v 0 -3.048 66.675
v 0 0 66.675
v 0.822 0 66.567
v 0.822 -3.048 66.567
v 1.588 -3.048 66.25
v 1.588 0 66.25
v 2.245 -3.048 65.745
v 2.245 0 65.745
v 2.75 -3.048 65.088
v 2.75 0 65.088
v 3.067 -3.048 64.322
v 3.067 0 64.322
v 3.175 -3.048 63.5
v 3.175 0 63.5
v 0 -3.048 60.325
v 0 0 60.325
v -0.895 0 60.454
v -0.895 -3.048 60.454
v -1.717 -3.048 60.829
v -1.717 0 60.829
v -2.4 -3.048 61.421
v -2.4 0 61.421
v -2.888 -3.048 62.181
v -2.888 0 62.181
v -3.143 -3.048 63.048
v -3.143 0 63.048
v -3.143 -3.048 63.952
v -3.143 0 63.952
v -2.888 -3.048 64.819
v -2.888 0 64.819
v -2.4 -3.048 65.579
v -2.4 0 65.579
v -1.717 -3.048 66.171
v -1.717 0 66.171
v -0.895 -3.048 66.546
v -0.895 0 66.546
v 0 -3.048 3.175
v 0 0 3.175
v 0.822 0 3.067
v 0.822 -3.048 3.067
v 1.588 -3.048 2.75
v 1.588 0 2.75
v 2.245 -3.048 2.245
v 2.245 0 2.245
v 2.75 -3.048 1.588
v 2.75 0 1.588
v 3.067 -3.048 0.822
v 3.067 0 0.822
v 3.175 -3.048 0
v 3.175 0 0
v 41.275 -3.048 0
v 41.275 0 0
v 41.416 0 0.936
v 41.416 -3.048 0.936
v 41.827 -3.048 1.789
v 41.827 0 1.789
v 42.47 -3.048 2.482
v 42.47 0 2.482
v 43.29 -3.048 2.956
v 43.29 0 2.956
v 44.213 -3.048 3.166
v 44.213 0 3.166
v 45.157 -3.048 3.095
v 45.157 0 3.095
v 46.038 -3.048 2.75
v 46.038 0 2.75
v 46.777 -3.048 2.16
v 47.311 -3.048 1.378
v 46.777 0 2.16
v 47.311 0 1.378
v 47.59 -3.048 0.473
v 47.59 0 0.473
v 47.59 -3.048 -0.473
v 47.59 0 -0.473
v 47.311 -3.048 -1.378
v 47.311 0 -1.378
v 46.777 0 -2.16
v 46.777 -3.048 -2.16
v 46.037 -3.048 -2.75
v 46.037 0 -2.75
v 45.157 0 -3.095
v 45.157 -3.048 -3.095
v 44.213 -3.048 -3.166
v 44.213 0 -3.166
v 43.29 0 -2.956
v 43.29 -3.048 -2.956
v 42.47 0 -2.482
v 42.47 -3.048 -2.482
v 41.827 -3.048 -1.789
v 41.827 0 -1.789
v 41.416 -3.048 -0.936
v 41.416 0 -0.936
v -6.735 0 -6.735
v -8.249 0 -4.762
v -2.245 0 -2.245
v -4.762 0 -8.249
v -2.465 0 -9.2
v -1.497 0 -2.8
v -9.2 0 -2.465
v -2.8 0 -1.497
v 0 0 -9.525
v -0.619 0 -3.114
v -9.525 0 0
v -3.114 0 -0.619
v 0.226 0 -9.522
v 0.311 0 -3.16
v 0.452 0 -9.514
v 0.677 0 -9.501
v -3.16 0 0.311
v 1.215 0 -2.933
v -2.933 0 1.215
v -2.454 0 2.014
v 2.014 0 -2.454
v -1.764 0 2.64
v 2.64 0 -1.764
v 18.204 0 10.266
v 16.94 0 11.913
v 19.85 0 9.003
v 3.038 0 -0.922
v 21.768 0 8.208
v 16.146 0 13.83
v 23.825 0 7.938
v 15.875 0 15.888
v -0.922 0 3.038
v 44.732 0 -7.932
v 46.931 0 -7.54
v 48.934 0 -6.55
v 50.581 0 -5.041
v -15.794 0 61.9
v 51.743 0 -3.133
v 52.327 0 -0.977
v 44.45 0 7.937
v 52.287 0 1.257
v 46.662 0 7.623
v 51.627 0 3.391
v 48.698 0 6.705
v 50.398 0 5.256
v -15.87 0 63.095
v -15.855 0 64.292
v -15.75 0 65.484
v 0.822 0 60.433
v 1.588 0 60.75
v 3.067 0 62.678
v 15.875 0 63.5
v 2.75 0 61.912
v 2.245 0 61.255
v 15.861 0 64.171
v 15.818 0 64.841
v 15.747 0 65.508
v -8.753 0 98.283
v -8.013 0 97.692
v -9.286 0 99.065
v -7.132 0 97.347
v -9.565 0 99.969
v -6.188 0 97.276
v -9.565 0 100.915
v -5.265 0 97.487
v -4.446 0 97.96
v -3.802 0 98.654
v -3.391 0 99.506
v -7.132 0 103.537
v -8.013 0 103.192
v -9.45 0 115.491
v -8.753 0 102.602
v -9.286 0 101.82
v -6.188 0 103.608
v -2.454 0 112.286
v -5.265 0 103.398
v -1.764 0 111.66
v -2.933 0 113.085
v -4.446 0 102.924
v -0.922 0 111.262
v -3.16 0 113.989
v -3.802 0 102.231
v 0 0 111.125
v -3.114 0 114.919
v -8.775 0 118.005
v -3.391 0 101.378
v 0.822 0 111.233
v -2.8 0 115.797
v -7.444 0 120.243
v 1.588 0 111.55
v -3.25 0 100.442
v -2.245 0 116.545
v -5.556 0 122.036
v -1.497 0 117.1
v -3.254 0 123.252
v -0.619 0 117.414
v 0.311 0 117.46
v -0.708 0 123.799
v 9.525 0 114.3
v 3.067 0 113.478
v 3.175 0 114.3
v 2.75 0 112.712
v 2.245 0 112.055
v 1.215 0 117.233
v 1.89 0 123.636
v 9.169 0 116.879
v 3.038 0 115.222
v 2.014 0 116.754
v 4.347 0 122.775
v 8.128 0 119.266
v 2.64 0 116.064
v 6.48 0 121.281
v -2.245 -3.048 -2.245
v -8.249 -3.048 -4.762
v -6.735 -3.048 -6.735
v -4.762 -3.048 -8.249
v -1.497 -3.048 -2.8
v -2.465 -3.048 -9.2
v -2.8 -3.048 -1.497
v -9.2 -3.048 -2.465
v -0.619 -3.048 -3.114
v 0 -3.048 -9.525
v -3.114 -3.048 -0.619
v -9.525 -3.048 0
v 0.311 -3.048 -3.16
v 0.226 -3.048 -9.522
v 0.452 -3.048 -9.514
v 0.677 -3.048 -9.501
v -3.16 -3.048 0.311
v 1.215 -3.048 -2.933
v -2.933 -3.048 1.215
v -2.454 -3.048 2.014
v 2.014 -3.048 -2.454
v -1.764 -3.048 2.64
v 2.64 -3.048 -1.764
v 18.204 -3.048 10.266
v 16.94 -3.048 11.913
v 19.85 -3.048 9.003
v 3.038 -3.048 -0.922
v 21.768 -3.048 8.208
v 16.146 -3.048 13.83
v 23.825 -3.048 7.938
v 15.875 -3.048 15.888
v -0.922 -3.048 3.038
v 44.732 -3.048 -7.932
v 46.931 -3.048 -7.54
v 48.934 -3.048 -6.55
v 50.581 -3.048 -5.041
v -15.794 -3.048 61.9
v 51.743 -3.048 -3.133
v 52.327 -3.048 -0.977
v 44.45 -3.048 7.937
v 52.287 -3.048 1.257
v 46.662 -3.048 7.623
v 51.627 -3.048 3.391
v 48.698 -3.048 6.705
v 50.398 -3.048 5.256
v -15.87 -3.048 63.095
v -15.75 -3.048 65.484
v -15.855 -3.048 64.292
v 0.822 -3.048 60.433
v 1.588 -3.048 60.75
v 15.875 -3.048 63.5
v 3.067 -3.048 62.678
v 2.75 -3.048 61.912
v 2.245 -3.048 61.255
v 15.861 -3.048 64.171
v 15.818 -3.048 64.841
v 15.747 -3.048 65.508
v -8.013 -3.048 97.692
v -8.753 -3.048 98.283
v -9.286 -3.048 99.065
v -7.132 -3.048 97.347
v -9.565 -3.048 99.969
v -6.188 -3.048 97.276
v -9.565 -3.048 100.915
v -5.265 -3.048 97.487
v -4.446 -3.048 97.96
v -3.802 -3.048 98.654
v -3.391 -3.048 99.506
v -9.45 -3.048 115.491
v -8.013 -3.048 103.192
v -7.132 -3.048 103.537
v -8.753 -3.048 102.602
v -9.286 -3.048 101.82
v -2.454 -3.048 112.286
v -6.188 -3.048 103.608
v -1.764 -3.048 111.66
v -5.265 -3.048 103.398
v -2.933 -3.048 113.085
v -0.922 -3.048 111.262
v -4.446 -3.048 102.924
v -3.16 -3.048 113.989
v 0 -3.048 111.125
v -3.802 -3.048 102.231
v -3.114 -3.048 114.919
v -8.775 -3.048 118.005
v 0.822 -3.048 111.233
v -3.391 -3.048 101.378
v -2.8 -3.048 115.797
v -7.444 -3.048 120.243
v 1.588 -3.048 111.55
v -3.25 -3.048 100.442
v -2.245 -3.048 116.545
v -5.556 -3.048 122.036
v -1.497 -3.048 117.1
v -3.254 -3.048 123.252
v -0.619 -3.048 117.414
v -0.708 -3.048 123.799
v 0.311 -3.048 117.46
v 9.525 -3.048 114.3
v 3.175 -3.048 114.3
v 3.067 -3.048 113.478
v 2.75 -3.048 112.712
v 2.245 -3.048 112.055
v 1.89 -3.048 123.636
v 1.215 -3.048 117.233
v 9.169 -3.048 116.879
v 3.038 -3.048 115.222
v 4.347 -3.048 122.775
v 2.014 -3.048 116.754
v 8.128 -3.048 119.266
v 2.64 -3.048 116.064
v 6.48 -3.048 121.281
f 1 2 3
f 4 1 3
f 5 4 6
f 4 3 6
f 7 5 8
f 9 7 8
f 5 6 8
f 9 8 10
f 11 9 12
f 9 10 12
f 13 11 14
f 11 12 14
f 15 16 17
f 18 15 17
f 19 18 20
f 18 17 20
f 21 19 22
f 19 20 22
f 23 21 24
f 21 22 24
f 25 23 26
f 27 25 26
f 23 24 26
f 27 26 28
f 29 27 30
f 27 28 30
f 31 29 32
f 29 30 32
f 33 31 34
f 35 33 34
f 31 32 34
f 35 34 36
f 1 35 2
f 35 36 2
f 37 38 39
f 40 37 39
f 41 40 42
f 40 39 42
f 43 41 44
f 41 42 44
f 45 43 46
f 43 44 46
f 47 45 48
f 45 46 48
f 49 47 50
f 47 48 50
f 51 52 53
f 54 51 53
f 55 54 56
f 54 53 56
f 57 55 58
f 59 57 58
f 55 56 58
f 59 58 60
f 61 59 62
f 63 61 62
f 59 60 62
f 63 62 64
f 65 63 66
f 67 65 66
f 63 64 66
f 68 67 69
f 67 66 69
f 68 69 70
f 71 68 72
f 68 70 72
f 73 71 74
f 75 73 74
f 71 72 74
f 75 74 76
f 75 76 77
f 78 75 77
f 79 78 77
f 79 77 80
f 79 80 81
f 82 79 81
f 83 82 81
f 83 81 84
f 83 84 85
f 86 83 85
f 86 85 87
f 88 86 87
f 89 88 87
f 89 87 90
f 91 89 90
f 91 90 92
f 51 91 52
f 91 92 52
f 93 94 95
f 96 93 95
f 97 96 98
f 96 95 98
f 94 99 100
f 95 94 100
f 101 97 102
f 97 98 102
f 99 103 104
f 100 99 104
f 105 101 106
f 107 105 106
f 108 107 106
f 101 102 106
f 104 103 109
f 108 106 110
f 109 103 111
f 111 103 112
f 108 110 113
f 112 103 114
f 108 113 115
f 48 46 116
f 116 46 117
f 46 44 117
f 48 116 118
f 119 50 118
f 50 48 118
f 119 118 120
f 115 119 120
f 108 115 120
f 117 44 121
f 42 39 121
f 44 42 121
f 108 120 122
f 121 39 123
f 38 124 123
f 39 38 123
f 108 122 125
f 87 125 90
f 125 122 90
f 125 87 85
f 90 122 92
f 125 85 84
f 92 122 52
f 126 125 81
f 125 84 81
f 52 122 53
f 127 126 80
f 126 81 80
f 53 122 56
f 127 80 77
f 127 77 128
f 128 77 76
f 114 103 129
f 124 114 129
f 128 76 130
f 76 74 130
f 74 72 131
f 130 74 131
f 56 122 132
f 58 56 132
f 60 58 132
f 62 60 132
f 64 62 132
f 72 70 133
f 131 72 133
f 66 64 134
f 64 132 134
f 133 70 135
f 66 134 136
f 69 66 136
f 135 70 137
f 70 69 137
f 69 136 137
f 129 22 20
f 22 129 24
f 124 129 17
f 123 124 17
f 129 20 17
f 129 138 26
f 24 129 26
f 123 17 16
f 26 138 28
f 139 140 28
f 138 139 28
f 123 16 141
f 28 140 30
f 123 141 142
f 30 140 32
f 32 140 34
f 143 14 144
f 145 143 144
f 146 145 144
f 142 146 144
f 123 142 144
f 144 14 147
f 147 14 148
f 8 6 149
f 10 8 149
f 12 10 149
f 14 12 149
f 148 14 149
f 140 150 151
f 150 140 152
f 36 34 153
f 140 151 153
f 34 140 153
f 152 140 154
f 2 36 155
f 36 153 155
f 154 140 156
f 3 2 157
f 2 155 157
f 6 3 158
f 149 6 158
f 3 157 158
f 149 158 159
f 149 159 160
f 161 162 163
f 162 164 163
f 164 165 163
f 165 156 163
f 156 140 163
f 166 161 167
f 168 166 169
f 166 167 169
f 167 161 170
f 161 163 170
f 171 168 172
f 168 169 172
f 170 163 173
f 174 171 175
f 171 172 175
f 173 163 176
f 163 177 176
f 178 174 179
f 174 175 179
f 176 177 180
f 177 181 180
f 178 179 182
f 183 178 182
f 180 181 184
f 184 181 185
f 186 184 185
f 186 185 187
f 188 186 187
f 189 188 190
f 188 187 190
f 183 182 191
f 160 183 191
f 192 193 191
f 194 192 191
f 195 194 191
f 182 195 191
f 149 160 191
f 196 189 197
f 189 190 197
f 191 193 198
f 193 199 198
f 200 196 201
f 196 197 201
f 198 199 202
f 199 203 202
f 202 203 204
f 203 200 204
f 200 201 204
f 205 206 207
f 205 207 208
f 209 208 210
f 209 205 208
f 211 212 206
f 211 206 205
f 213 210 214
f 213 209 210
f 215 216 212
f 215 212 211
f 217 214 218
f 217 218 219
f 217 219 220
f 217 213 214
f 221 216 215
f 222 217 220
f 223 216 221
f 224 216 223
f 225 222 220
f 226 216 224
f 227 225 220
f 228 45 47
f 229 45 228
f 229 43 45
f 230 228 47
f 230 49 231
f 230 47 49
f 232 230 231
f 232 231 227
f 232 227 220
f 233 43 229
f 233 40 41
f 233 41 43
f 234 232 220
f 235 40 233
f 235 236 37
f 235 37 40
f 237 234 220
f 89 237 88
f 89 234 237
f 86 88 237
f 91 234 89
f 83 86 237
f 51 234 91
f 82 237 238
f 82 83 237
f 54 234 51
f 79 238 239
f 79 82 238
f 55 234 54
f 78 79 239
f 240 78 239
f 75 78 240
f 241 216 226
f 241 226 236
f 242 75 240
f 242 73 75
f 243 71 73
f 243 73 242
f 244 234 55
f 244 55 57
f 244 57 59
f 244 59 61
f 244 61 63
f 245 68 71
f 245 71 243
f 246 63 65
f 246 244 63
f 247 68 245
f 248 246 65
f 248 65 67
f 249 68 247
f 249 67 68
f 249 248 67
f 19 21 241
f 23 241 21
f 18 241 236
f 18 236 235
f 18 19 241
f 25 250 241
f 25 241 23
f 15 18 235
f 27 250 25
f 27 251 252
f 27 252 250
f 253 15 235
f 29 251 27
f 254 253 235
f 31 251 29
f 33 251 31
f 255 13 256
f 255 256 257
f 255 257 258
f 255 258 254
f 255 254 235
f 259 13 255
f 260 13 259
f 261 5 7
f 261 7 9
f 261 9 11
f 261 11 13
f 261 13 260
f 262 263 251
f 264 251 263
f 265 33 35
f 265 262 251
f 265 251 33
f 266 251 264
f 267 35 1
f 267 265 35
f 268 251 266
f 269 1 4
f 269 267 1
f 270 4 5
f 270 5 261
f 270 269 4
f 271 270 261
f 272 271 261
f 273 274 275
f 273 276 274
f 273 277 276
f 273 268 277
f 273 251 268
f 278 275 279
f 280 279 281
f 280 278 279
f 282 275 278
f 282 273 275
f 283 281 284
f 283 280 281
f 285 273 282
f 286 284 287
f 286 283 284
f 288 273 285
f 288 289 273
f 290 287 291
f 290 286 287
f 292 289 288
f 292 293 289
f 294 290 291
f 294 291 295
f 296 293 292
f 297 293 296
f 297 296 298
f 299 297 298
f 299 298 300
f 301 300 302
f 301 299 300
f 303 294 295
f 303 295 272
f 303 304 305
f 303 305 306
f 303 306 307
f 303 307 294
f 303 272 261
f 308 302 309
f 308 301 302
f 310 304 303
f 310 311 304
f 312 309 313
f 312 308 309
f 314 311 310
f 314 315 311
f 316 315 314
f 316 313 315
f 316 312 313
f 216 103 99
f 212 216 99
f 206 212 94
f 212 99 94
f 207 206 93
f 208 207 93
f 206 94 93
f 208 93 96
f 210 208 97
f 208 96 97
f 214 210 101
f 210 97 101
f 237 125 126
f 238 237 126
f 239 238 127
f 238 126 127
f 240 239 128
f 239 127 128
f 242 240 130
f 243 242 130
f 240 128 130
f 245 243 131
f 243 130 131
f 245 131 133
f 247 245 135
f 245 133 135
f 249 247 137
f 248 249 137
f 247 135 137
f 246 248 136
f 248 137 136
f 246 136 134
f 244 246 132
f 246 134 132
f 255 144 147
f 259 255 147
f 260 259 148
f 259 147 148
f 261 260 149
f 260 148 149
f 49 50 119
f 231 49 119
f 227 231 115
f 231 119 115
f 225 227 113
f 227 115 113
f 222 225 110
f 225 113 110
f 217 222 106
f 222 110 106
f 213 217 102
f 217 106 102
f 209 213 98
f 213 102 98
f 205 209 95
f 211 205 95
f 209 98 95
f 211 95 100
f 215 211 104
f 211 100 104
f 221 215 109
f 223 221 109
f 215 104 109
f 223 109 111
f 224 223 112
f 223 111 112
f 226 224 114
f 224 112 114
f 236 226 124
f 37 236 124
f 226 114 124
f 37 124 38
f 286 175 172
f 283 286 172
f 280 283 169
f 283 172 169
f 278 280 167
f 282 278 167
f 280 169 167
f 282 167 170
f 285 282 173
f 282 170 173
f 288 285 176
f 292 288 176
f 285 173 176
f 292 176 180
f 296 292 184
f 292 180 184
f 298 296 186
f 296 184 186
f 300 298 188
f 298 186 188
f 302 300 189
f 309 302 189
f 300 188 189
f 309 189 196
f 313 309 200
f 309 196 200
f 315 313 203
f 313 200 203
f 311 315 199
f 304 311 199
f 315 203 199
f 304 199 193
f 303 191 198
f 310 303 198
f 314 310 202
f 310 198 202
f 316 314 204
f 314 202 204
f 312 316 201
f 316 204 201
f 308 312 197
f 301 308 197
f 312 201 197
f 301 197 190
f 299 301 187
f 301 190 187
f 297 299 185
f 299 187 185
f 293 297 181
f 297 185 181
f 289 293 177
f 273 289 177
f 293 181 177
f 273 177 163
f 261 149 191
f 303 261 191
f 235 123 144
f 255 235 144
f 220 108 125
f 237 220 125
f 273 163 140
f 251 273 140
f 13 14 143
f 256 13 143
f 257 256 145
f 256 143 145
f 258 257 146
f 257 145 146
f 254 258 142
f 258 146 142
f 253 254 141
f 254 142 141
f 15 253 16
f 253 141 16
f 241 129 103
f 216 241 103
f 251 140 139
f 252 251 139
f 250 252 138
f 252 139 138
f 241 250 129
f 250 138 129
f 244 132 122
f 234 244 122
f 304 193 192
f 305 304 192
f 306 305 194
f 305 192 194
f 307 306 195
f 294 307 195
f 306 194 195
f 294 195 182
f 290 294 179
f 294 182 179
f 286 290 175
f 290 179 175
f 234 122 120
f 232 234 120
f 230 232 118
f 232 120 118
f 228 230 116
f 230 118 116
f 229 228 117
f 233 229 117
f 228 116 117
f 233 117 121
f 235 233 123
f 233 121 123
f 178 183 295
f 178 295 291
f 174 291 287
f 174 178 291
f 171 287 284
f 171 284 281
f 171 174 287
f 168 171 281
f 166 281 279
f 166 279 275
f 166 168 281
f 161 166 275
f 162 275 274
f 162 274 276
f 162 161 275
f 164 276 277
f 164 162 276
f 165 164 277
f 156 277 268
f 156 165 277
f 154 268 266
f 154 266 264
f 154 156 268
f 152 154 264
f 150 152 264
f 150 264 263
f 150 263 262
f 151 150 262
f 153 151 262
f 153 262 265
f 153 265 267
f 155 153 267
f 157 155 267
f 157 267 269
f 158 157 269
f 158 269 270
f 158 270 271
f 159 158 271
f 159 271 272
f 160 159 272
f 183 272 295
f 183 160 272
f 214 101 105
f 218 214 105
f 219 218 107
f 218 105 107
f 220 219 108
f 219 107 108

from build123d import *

# Parameters (mm, degrees)
F0_R     = 3.175
F1_DEPTH = 3.048


with BuildPart() as f1:
    # F0 (on Front) → F1 (new body)
    with BuildSketch(Plane.XZ):
        with BuildLine():
            ThreePointArc((3.175, 0), (-2.2450640303, -2.2450640303), (0, 3.175))
            Line((0, 3.175), (0, 9.525))
            ThreePointArc((0, 9.525), (-6.7351920908, 6.7351920908), (-9.525, 0))
            ThreePointArc((-9.525, 0), (-6.7351920908, -6.7351920908), (0, -9.525))
            Line((0, -9.525), (0.6773435479, -9.500885786))
            ThreePointArc((0.6773435479, -9.500885786), (6.9705567315, -6.4912990883), (9.525, 0))
            Line((9.525, 0), (3.175, 0))
        make_face()
        with BuildLine():
            ThreePointArc((-9.525, 0), (-6.7351920908, 6.7351920908), (0, 9.525))
            Line((0, 9.525), (0, 47.625))
            ThreePointArc((0, 47.625), (-10.644756084, 51.722700101), (-15.7942028036, 61.9003804205))
            Line((-15.7942028036, 61.9003804205), (-9.525, 0))
        make_face()
        with BuildLine():
            Line((0, 47.625), (0, 9.525))
            ThreePointArc((0, 9.525), (6.7351920908, 6.7351920908), (9.525, 0))
            Line((9.525, 0), (36.5125, 0))
            ThreePointArc((36.5125, 0), (38.8373399243, 5.6126600757), (44.45, 7.9375))
            Line((44.45, 7.9375), (23.8252, 7.9375))
            ThreePointArc((23.8252, 7.9375), (18.2035596682, 10.2660596682), (15.875, 15.8877))
            Line((15.875, 15.8877), (15.875, 63.5))
            ThreePointArc((15.875, 63.5), (11.2253201513, 52.2746798487), (0, 47.625))
        make_face()
        with BuildLine():
            Line((36.5125, 0), (9.525, 0))
            ThreePointArc((9.525, 0), (6.9705567315, -6.4912990883), (0.6773435479, -9.500885786))
            Line((0.6773435479, -9.500885786), (44.7324052746, -7.9324746146))
            ThreePointArc((44.7324052746, -7.9324746146), (38.9380895153, -5.7116327839), (36.5125, 0))
        make_face()
        with BuildLine():
            ThreePointArc((-15.7942028036, 61.9003804205), (-10.644756084, 51.722700101), (0, 47.625))
            Line((0, 47.625), (0, 60.325))
            ThreePointArc((0, 60.325), (-3.175, 63.5), (0, 66.675))
            Line((0, 66.675), (0, 79.375))
            ThreePointArc((0, 79.375), (-10.5003255158, 75.40625), (-15.7504882737, 65.484375))
            ThreePointArc((-15.7504882737, 65.484375), (-15.8738192656, 63.6936154008), (-15.7942028036, 61.9003804205))
        make_face()
        with BuildLine():
            Line((0, 60.325), (0, 47.625))
            ThreePointArc((0, 47.625), (11.2253201513, 52.2746798487), (15.875, 63.5))
            ThreePointArc((15.875, 63.5), (15.8430821396, 64.5061676396), (15.7474569047, 65.5082893304))
            ThreePointArc((15.7474569047, 65.5082893304), (10.4912828548, 75.4142187767), (0, 79.375))
            Line((0, 79.375), (0, 66.675))
            ThreePointArc((0, 66.675), (2.2450640303, 65.7450640303), (3.175, 63.5))
            ThreePointArc((3.175, 63.5), (2.2450640303, 61.2549359697), (0, 60.325))
        make_face()
        with BuildLine():
            ThreePointArc((44.45, 7.9375), (38.8373399243, 5.6126600757), (36.5125, 0))
            ThreePointArc((36.5125, 0), (38.9380895153, -5.7116327839), (44.7324052746, -7.9324746146))
            ThreePointArc((44.7324052746, -7.9324746146), (50.1616327839, -5.5119104847), (52.3875, 0))
            ThreePointArc((52.3875, 0), (50.0626600757, 5.6126600757), (44.45, 7.9375))
        make_face()
        with BuildLine():
            ThreePointArc((47.625, 0), (44.45, -3.175), (41.275, 0))
            ThreePointArc((41.275, 0), (44.45, 3.175), (47.625, 0))
        make_face(mode=Mode.SUBTRACT)
        with BuildLine():
            ThreePointArc((0, -9.525), (0.3388863295, -9.5189695375), (0.6773435479, -9.500885786))
            Line((0.6773435479, -9.500885786), (0, -9.525))
        make_face()
        with BuildLine():
            Line((-9.4502929642, 115.490625), (-15.7504882737, 65.484375))
            ThreePointArc((-15.7504882737, 65.484375), (-10.5003255158, 75.40625), (0, 79.375))
            Line((0, 79.375), (0, 104.775))
            ThreePointArc((0, 104.775), (-7.14375, 107.9998046905), (-9.4502929642, 115.490625))
        make_face()
        with Locations((-6.4251534641, 100.4420816898)):
            Circle(F0_R, mode=Mode.SUBTRACT)
        with BuildLine():
            ThreePointArc((0, 79.375), (10.4912828548, 75.4142187767), (15.7474569047, 65.5082893304))
            Line((15.7474569047, 65.5082893304), (9.525, 114.3))
            ThreePointArc((9.525, 114.3), (6.7351920908, 107.5648079092), (0, 104.775))
            Line((0, 104.775), (0, 79.375))
        make_face()
        with BuildLine():
            ThreePointArc((9.525, 114.3), (0.596483242, 123.8063048942), (-9.4502929642, 115.490625))
            ThreePointArc((-9.4502929642, 115.490625), (-7.14375, 107.9998046905), (0, 104.775))
            ThreePointArc((0, 104.775), (6.7351920908, 107.5648079092), (9.525, 114.3))
        make_face()
        with BuildLine():
            ThreePointArc((3.175, 114.3), (2.2450640303, 112.0549359697), (0, 111.125))
            ThreePointArc((0, 111.125), (-2.2450640303, 116.5450640303), (3.175, 114.3))
        make_face(mode=Mode.SUBTRACT)
        with BuildLine():
            Line((0, 9.525), (0, 3.175))
            ThreePointArc((0, 3.175), (2.2450640303, 2.2450640303), (3.175, 0))
            Line((3.175, 0), (9.525, 0))
            ThreePointArc((9.525, 0), (6.7351920908, 6.7351920908), (0, 9.525))
        make_face()
    extrude(amount=F1_DEPTH)


solid = f1.part
